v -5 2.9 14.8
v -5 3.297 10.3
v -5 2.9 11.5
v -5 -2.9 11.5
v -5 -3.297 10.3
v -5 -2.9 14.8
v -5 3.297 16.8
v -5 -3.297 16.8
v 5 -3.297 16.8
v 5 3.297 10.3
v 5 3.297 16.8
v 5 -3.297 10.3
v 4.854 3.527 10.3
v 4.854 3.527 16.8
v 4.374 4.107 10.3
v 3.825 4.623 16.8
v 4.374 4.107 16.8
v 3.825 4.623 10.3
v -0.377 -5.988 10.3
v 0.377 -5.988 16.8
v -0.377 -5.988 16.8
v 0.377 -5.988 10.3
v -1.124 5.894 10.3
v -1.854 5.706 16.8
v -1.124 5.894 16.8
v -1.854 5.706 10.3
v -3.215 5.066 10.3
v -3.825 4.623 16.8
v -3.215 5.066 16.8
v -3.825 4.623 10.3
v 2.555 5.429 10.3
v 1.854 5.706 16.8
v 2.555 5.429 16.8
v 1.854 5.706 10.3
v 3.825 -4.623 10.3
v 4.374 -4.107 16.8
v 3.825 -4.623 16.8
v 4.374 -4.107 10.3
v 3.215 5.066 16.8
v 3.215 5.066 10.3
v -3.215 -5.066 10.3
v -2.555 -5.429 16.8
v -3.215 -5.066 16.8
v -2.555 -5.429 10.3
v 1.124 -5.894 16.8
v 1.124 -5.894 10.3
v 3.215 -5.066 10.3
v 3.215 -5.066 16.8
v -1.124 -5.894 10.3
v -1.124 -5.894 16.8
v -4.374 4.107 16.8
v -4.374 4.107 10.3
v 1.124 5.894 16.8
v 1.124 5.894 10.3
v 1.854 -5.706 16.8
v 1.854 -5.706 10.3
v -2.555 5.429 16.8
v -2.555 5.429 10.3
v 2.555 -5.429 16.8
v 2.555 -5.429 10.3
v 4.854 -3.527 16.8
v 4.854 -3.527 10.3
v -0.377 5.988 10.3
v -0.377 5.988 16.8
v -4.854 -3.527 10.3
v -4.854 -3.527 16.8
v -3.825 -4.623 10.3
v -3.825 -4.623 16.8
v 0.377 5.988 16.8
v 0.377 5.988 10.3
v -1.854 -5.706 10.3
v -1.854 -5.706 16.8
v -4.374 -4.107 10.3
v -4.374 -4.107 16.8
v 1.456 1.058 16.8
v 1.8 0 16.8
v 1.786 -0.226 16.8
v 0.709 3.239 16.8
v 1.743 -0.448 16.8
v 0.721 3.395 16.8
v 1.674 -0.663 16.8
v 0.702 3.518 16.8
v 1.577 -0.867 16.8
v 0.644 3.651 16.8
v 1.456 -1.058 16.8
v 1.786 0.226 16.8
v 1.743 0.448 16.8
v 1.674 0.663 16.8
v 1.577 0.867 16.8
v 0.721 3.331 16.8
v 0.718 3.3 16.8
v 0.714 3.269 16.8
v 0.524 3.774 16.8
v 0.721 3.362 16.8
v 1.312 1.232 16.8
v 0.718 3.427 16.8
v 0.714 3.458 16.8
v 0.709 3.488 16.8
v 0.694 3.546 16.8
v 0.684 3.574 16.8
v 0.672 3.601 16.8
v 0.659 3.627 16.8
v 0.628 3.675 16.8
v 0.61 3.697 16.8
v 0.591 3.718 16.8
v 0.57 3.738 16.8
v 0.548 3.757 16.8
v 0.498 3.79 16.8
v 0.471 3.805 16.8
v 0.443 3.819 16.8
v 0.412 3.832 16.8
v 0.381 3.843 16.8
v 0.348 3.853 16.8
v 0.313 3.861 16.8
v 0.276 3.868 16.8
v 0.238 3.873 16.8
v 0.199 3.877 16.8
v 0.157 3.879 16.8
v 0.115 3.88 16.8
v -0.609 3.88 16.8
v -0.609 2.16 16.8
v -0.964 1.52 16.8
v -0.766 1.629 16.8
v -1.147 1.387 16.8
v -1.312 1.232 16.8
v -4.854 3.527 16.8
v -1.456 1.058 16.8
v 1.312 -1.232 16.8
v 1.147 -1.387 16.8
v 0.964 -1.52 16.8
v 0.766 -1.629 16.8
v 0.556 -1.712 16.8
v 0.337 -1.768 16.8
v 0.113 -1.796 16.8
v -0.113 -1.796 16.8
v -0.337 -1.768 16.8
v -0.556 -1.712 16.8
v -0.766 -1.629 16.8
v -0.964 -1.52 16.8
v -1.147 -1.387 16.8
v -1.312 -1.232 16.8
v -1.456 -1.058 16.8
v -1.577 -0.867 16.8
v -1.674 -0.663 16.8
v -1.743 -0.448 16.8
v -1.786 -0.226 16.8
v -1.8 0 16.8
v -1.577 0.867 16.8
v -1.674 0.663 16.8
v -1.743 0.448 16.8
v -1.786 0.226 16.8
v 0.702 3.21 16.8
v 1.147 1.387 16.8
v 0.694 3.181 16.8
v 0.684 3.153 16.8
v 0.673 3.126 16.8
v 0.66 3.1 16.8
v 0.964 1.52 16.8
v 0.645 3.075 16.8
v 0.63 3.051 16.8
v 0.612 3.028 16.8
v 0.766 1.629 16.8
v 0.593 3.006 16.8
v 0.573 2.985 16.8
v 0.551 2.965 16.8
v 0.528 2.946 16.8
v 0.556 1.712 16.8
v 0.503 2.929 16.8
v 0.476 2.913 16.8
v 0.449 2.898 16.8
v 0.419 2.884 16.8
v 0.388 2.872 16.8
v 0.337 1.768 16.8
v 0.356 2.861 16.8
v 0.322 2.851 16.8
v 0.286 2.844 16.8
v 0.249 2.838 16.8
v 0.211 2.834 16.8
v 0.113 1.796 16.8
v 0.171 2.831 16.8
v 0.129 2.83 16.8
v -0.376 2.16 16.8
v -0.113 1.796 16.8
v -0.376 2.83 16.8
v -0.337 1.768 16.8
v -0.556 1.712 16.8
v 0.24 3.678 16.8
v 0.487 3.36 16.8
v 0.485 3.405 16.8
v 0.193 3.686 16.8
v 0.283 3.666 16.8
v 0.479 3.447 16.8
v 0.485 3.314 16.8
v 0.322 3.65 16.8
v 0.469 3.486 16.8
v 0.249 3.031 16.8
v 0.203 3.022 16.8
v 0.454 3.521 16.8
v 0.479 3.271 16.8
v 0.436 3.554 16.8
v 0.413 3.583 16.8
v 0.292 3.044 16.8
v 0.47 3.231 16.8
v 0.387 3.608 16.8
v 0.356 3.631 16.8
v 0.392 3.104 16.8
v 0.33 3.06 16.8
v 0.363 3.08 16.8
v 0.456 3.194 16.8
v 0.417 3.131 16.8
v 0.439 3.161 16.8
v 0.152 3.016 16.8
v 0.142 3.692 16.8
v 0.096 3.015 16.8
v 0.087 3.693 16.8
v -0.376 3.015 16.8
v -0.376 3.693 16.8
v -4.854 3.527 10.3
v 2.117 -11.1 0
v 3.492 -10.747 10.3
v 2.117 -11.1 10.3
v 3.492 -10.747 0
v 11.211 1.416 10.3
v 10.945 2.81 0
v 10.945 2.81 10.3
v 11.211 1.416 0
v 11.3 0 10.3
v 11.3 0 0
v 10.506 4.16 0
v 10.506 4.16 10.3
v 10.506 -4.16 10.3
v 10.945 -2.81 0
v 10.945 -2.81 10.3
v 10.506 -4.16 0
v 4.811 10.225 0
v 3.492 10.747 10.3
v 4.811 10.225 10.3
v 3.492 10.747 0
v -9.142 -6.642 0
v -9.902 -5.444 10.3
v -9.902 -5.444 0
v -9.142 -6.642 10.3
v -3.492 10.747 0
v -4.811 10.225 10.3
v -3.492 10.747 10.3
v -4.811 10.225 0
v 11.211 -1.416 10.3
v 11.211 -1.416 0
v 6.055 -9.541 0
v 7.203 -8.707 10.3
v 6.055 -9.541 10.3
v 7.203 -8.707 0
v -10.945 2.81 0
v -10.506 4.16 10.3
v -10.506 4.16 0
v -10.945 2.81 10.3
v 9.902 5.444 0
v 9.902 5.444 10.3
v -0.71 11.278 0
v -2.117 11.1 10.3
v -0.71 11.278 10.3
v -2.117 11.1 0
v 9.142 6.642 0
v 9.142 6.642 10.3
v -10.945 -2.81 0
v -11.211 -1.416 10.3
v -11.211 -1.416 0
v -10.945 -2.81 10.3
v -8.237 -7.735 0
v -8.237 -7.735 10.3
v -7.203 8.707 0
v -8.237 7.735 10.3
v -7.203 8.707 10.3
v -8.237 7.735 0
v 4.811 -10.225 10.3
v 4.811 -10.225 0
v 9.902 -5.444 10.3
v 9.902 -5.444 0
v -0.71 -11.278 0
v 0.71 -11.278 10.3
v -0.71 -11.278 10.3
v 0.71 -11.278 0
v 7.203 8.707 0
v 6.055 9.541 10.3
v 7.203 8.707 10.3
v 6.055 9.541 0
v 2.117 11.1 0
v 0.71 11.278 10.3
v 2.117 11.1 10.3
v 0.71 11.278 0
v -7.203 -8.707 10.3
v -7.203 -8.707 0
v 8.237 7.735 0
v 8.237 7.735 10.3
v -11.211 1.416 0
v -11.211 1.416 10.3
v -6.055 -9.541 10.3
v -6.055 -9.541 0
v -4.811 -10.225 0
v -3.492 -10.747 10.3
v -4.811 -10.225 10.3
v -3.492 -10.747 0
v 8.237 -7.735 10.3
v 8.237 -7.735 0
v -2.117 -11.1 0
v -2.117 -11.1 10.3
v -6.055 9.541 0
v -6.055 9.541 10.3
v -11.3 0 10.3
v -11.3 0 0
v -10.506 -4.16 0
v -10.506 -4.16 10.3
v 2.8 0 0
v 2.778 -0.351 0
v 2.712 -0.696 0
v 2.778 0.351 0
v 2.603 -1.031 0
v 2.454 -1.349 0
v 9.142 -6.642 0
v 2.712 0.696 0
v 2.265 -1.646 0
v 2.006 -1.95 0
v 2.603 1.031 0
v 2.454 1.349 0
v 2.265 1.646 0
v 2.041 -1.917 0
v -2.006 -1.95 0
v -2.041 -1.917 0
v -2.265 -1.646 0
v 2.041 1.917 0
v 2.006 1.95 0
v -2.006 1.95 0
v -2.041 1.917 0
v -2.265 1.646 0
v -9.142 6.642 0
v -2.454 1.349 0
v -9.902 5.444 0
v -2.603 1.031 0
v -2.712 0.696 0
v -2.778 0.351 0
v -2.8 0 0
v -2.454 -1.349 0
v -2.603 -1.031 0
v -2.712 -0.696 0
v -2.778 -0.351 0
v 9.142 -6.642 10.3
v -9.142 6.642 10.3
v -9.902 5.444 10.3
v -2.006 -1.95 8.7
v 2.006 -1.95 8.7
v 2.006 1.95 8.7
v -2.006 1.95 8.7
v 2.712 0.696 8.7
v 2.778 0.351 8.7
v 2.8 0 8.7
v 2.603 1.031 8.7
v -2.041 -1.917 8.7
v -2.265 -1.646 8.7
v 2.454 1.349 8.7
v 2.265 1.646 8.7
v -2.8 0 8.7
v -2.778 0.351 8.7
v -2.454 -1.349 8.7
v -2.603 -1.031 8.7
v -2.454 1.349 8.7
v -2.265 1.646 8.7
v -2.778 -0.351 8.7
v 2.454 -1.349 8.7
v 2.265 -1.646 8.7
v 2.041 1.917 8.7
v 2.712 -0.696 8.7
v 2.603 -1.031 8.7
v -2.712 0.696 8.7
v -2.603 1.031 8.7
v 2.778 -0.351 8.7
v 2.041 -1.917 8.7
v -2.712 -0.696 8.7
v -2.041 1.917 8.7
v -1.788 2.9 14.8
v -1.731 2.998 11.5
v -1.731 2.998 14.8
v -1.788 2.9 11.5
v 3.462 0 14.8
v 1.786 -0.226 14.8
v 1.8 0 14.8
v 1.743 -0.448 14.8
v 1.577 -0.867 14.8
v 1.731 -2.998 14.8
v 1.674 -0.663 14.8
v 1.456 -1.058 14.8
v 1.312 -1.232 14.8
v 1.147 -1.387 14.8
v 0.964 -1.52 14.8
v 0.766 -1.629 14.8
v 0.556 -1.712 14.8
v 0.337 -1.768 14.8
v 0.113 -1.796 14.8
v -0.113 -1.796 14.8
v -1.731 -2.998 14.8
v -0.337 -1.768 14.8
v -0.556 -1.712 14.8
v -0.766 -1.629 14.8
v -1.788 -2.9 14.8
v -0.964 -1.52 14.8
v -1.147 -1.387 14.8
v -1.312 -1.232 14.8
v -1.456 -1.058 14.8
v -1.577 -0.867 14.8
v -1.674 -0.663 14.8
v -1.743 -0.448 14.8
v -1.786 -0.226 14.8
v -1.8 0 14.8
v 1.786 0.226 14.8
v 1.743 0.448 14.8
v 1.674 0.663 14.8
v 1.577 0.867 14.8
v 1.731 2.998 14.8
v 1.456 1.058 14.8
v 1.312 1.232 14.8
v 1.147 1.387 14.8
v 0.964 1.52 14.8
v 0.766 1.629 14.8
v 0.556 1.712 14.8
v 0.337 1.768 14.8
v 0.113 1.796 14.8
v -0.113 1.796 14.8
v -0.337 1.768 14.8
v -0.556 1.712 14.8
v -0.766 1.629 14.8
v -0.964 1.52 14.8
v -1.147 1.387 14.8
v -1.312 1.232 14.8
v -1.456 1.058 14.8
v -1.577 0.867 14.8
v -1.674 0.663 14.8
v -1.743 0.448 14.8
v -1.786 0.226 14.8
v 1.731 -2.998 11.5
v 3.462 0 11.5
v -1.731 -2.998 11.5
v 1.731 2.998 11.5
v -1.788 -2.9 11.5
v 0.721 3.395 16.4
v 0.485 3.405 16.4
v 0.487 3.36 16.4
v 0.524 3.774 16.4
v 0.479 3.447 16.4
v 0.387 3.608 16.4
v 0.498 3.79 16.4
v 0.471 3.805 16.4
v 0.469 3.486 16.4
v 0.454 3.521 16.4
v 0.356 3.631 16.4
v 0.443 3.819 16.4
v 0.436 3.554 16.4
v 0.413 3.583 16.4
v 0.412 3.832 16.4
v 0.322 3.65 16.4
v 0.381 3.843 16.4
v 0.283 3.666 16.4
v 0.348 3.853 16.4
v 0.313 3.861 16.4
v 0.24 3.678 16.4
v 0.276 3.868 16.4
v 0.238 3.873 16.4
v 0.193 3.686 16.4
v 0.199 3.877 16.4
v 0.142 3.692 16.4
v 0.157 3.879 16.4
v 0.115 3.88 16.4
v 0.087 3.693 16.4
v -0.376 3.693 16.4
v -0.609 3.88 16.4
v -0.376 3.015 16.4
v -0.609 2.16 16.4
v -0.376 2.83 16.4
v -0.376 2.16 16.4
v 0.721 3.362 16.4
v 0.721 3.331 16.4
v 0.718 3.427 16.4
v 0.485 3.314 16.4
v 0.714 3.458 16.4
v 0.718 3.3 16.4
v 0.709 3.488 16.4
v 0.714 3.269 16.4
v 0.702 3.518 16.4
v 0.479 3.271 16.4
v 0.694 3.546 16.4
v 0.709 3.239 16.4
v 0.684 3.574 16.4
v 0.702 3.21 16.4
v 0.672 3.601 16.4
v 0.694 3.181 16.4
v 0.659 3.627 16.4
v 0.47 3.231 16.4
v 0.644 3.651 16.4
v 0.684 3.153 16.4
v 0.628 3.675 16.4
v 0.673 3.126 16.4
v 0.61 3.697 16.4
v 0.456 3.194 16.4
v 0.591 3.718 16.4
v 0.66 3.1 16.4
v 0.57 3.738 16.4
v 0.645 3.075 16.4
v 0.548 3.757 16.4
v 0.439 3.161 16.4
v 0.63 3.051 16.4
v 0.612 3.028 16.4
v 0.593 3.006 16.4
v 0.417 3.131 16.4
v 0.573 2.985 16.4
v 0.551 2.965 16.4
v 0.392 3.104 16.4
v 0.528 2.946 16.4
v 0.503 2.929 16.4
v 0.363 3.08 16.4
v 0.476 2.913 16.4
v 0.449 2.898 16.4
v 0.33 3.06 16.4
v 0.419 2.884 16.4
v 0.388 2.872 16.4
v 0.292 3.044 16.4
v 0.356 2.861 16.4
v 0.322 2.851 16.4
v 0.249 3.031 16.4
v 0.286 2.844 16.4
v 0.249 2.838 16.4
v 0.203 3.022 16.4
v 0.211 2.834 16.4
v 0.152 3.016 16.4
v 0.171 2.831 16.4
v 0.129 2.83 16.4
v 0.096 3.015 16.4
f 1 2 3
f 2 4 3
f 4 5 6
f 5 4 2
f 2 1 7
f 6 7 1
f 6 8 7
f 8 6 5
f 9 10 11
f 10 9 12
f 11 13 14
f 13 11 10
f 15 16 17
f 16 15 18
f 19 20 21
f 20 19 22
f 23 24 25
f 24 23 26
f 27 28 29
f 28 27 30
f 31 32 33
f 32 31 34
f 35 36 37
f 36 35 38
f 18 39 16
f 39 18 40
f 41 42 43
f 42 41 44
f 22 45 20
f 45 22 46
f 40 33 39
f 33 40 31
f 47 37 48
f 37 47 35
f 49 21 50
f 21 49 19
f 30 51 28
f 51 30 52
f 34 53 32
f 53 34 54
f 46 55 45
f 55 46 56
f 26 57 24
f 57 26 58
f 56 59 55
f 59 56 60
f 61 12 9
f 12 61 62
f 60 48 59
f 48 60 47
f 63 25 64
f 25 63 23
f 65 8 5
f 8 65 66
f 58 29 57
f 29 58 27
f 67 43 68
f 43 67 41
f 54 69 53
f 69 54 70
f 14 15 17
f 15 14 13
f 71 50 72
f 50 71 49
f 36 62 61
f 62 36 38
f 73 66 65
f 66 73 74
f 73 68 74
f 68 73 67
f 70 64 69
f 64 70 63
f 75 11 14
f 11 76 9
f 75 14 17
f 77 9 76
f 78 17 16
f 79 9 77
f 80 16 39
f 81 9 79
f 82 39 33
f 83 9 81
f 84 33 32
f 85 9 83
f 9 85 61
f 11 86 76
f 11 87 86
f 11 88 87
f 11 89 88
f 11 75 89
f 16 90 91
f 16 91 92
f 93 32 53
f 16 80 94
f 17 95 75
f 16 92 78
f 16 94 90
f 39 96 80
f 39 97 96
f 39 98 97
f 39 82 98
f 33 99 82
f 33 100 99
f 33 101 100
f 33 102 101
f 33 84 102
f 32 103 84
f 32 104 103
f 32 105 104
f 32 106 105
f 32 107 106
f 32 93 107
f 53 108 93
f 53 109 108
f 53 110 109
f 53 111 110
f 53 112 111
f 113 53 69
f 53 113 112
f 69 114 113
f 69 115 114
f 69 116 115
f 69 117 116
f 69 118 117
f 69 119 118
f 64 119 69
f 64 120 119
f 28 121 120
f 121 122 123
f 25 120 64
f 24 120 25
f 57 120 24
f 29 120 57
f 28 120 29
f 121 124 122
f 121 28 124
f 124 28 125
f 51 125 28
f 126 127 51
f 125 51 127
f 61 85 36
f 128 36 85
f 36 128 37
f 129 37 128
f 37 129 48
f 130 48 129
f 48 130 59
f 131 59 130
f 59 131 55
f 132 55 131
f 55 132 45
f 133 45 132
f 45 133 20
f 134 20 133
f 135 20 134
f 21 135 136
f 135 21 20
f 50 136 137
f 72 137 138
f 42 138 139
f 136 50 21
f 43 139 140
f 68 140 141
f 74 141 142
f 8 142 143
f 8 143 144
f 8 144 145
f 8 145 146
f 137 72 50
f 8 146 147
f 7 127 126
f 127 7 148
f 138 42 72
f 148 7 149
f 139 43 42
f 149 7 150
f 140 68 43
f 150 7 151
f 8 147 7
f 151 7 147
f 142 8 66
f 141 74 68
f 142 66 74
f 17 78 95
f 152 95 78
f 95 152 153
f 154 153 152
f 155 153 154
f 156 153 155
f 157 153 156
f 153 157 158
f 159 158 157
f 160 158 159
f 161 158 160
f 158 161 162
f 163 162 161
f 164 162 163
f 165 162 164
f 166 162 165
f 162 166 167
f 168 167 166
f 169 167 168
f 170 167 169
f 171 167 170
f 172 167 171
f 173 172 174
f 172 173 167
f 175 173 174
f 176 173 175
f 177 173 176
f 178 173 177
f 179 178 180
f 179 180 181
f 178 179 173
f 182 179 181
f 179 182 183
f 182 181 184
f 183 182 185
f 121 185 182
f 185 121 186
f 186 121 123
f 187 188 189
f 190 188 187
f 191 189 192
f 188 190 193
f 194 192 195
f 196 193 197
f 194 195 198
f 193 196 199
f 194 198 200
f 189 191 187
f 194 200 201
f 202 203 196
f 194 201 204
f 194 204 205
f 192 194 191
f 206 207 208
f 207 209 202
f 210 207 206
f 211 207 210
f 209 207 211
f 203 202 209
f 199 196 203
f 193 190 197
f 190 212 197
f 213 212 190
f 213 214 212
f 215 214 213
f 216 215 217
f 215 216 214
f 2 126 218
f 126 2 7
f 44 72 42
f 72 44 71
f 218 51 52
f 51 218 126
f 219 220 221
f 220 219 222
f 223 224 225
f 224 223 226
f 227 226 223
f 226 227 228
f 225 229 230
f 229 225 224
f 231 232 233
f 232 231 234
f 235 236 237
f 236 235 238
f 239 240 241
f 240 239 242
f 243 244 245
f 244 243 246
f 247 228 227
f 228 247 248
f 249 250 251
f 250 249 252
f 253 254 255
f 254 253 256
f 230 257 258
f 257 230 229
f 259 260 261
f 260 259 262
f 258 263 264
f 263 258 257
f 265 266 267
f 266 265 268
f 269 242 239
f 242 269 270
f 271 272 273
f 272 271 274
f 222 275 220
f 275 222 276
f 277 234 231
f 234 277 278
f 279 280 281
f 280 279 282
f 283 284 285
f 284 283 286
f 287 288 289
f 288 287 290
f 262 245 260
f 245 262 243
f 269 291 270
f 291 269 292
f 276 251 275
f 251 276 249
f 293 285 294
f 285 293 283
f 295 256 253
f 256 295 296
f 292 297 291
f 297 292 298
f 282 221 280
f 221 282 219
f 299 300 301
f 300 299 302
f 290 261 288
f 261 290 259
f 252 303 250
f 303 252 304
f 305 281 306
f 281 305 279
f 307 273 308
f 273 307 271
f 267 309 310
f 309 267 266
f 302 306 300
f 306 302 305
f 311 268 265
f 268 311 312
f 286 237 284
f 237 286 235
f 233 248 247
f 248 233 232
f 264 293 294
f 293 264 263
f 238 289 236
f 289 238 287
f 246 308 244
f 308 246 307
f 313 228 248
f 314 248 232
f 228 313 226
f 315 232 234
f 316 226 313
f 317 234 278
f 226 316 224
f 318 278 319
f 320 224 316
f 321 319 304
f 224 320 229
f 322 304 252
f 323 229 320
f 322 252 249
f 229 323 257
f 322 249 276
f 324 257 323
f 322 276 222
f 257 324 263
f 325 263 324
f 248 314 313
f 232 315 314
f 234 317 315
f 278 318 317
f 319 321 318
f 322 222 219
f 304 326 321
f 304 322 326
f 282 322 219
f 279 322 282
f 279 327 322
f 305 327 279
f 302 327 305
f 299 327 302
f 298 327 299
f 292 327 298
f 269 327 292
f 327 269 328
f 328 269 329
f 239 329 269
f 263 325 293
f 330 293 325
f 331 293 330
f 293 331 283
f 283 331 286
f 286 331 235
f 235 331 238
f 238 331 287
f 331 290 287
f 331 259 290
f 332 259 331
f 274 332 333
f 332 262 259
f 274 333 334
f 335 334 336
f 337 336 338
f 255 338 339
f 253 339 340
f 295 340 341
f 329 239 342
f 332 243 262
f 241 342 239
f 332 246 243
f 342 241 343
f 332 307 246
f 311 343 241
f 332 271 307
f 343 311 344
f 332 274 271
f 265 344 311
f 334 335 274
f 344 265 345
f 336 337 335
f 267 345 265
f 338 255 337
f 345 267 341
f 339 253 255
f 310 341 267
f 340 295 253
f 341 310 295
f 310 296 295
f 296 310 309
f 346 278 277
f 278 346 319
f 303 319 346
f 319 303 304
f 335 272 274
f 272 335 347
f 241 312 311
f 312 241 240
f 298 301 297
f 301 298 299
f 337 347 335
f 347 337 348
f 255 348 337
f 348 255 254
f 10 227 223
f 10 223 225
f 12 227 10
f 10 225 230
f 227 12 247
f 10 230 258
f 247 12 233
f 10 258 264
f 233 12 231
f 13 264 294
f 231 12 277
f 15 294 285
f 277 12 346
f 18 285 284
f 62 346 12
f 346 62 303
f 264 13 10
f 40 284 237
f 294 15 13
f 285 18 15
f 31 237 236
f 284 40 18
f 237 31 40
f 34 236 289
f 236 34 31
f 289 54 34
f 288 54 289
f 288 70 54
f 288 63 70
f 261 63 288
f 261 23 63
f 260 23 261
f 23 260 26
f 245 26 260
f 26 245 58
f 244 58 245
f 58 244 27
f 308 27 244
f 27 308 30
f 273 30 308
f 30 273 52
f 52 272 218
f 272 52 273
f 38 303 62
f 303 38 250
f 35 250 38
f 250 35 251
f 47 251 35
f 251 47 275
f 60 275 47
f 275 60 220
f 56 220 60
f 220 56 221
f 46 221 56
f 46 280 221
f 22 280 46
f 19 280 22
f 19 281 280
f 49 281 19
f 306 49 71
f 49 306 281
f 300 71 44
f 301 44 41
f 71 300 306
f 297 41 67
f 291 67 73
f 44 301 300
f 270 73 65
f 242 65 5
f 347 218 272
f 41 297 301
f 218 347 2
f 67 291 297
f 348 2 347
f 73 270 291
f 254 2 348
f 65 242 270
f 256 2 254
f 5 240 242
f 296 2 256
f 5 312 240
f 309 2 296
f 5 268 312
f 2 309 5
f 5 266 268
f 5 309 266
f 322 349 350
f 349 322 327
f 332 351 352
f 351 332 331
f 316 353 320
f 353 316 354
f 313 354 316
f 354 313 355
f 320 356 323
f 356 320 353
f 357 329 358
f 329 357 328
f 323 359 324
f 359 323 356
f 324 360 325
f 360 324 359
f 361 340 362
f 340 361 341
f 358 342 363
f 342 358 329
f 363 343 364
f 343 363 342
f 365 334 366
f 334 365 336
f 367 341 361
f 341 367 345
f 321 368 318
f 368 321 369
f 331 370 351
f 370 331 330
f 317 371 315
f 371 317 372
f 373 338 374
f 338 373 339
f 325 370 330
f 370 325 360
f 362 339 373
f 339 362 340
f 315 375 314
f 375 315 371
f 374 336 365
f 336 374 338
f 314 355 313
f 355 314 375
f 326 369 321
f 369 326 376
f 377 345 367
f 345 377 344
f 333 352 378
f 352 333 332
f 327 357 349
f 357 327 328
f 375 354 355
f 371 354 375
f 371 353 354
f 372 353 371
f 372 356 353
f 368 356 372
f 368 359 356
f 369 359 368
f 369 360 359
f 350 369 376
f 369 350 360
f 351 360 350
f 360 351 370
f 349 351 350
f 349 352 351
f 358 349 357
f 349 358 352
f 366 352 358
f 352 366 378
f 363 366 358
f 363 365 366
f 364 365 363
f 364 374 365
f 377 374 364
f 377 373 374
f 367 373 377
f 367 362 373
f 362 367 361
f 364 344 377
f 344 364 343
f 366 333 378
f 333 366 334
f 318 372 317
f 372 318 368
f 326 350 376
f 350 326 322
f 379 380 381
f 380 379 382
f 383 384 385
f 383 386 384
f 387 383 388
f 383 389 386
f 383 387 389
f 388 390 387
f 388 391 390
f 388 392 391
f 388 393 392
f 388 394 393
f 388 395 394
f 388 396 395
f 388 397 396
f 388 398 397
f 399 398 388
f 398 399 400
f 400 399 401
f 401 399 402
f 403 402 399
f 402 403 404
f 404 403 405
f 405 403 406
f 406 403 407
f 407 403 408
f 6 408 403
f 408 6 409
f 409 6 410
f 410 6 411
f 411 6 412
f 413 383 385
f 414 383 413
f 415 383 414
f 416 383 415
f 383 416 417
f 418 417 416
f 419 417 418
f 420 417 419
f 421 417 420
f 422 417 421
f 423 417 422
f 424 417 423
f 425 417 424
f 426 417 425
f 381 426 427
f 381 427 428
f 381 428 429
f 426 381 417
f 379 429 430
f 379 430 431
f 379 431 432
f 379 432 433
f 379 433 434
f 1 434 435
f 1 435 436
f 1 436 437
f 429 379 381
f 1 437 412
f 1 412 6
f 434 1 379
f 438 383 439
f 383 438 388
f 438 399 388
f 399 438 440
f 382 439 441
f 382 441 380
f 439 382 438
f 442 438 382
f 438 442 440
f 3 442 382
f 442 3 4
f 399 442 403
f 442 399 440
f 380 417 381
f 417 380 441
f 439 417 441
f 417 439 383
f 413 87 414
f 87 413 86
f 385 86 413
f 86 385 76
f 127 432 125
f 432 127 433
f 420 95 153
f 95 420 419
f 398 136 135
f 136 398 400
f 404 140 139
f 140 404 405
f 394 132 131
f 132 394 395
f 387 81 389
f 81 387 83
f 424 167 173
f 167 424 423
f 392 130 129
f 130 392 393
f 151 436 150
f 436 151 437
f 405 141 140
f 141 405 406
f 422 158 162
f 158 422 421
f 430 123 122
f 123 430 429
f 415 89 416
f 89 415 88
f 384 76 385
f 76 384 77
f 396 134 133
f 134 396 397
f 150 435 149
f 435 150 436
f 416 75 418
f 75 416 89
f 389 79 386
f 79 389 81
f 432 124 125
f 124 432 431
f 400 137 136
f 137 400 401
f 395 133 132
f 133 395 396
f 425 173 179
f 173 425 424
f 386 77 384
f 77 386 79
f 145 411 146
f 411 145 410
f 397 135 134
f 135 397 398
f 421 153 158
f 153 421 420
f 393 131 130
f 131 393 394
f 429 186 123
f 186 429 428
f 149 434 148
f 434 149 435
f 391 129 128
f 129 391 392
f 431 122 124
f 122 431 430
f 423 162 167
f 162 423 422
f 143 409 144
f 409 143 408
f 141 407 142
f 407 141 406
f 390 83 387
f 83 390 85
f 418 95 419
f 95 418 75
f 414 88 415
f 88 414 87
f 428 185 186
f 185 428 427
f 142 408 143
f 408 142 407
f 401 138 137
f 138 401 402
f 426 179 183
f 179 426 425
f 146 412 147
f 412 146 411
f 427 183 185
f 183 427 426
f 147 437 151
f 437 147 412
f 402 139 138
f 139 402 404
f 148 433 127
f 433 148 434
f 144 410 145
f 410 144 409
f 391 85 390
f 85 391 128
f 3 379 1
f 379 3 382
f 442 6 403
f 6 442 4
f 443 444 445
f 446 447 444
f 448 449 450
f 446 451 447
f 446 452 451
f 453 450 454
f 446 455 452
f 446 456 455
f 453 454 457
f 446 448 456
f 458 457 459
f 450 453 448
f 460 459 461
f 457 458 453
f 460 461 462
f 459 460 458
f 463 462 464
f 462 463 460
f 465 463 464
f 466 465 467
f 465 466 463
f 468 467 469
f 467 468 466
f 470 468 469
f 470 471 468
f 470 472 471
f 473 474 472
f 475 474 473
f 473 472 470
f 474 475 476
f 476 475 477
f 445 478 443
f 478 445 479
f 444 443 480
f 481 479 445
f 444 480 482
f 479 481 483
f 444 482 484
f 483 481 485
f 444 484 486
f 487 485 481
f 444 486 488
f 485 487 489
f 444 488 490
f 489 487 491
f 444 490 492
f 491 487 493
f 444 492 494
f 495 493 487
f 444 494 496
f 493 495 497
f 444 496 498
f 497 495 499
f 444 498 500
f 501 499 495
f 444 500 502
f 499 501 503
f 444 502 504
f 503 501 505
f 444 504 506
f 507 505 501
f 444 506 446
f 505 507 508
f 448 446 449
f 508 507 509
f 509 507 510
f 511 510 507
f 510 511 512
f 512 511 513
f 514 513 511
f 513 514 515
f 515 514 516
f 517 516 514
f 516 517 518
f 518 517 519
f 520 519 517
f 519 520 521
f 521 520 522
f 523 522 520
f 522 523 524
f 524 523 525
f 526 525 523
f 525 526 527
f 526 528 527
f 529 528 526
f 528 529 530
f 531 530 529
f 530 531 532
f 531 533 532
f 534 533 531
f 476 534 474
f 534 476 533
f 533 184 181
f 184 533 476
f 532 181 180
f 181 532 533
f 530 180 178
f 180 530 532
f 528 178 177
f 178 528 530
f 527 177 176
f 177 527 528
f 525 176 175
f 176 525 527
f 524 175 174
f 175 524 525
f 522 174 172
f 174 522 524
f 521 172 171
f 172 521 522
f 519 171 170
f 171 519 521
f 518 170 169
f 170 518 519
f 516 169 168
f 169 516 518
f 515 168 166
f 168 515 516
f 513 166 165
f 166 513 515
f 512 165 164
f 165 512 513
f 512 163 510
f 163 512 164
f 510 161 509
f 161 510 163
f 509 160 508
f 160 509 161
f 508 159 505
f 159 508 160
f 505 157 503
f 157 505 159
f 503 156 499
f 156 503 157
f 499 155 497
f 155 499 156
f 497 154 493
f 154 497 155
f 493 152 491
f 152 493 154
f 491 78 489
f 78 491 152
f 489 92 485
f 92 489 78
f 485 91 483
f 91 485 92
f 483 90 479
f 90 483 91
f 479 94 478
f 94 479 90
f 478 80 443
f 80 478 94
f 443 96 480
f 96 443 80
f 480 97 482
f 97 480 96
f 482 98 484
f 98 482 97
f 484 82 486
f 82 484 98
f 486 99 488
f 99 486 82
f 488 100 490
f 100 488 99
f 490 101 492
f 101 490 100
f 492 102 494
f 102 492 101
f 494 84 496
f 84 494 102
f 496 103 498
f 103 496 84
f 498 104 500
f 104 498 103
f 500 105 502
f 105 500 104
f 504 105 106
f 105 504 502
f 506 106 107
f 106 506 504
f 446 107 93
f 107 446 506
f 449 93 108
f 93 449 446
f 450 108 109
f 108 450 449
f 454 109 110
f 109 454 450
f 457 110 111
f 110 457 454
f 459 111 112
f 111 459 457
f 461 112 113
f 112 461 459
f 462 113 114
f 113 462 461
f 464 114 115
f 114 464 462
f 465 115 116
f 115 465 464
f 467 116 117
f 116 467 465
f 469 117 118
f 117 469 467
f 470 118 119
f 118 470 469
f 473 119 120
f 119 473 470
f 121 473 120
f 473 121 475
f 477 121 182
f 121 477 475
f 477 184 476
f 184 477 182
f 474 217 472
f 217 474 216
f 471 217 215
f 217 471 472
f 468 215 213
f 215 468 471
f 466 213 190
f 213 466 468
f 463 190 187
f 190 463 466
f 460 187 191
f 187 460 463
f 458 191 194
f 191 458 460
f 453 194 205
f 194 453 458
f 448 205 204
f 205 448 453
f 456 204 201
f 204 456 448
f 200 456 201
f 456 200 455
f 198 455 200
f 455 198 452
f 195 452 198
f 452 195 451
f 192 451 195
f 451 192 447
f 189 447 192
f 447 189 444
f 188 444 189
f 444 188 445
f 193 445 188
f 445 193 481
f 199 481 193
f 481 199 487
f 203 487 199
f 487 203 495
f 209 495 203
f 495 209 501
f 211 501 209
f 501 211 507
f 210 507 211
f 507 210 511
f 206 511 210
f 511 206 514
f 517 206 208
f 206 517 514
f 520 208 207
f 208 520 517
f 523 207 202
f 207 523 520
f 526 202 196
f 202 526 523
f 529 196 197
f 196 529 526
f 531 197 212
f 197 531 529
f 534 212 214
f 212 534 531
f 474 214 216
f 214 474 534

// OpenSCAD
$fn = 50;

difference() {
	union() {
		translate(v = [0, 0, -3.5]) {
			rotate(a = [0, 0, 0]) {
				difference() {
					union() {
						translate(v = [0, 0, 0]) {
							rotate(a = [0, 0, 0]) {
								difference() {
									union() {
										translate(v = [0, 0, 13.79]) {
											cylinder(h = 6.51, r = 6.0);
										}
									}
									union() {
										translate(v = [-25.0, -20.0, 12.790000000000001]) {
											cube(size = [20, 40, 8.51]);
										}
										translate(v = [5.0, -20.0, 12.790000000000001]) {
											cube(size = [20, 40, 8.51]);
										}
									}
								}
							}
						}
						translate(v = [0, 0, 3.5]) {
							cylinder(h = 10.3, r = 11.3);
						}
					}
					union() {
						translate(v = [0, 0, 0]) {
							rotate(a = [0, 0, 0]) {
								difference() {
									union() {
										translate(v = [0, 0, 3.4]) {
											cylinder(h = 8.799999999999999, r = 2.8000000000000003);
										}
									}
									union() {
										translate(v = [-20.0, -21.95, 2.4]) {
											cube(size = [40, 20, 10.799999999999999]);
										}
										translate(v = [-20.0, 1.9499999999999993, 2.4]) {
											cube(size = [40, 20, 10.799999999999999]);
										}
									}
								}
							}
						}
						translate(v = [0, 0, 15]) {
							rotate(a = [0, 0, 0]) {
								difference() {
									union() {
										linear_extrude(height = 3.3) {
											polygon(points = [[3.4619999999999997, 0.0], [1.7310000000000003, 2.9981799479017264], [-1.7309999999999992, 2.9981799479017264], [-3.4619999999999997, 4.2397272186481365e-16], [-1.7310000000000014, -2.998179947901726], [1.7309999999999977, -2.9981799479017277]]);
										}
									}
									union();
								}
							}
						}
						translate(v = [0, 0, 15]) {
							cylinder(h = 6.300000000000001, r = 1.8);
						}
						translate(v = [-8.0, -2.9, 15]) {
							cube(size = [8, 5.8, 3.3]);
						}
						translate(v = [0, 3, 19.900000000000002]) {
							linear_extrude(height = 0.45) {
								text(font = "Liberation Sans", halign = "center", size = 1.8, text = "P", valign = "center");
							}
						}
					}
				}
			}
		}
	}
	union();
}
